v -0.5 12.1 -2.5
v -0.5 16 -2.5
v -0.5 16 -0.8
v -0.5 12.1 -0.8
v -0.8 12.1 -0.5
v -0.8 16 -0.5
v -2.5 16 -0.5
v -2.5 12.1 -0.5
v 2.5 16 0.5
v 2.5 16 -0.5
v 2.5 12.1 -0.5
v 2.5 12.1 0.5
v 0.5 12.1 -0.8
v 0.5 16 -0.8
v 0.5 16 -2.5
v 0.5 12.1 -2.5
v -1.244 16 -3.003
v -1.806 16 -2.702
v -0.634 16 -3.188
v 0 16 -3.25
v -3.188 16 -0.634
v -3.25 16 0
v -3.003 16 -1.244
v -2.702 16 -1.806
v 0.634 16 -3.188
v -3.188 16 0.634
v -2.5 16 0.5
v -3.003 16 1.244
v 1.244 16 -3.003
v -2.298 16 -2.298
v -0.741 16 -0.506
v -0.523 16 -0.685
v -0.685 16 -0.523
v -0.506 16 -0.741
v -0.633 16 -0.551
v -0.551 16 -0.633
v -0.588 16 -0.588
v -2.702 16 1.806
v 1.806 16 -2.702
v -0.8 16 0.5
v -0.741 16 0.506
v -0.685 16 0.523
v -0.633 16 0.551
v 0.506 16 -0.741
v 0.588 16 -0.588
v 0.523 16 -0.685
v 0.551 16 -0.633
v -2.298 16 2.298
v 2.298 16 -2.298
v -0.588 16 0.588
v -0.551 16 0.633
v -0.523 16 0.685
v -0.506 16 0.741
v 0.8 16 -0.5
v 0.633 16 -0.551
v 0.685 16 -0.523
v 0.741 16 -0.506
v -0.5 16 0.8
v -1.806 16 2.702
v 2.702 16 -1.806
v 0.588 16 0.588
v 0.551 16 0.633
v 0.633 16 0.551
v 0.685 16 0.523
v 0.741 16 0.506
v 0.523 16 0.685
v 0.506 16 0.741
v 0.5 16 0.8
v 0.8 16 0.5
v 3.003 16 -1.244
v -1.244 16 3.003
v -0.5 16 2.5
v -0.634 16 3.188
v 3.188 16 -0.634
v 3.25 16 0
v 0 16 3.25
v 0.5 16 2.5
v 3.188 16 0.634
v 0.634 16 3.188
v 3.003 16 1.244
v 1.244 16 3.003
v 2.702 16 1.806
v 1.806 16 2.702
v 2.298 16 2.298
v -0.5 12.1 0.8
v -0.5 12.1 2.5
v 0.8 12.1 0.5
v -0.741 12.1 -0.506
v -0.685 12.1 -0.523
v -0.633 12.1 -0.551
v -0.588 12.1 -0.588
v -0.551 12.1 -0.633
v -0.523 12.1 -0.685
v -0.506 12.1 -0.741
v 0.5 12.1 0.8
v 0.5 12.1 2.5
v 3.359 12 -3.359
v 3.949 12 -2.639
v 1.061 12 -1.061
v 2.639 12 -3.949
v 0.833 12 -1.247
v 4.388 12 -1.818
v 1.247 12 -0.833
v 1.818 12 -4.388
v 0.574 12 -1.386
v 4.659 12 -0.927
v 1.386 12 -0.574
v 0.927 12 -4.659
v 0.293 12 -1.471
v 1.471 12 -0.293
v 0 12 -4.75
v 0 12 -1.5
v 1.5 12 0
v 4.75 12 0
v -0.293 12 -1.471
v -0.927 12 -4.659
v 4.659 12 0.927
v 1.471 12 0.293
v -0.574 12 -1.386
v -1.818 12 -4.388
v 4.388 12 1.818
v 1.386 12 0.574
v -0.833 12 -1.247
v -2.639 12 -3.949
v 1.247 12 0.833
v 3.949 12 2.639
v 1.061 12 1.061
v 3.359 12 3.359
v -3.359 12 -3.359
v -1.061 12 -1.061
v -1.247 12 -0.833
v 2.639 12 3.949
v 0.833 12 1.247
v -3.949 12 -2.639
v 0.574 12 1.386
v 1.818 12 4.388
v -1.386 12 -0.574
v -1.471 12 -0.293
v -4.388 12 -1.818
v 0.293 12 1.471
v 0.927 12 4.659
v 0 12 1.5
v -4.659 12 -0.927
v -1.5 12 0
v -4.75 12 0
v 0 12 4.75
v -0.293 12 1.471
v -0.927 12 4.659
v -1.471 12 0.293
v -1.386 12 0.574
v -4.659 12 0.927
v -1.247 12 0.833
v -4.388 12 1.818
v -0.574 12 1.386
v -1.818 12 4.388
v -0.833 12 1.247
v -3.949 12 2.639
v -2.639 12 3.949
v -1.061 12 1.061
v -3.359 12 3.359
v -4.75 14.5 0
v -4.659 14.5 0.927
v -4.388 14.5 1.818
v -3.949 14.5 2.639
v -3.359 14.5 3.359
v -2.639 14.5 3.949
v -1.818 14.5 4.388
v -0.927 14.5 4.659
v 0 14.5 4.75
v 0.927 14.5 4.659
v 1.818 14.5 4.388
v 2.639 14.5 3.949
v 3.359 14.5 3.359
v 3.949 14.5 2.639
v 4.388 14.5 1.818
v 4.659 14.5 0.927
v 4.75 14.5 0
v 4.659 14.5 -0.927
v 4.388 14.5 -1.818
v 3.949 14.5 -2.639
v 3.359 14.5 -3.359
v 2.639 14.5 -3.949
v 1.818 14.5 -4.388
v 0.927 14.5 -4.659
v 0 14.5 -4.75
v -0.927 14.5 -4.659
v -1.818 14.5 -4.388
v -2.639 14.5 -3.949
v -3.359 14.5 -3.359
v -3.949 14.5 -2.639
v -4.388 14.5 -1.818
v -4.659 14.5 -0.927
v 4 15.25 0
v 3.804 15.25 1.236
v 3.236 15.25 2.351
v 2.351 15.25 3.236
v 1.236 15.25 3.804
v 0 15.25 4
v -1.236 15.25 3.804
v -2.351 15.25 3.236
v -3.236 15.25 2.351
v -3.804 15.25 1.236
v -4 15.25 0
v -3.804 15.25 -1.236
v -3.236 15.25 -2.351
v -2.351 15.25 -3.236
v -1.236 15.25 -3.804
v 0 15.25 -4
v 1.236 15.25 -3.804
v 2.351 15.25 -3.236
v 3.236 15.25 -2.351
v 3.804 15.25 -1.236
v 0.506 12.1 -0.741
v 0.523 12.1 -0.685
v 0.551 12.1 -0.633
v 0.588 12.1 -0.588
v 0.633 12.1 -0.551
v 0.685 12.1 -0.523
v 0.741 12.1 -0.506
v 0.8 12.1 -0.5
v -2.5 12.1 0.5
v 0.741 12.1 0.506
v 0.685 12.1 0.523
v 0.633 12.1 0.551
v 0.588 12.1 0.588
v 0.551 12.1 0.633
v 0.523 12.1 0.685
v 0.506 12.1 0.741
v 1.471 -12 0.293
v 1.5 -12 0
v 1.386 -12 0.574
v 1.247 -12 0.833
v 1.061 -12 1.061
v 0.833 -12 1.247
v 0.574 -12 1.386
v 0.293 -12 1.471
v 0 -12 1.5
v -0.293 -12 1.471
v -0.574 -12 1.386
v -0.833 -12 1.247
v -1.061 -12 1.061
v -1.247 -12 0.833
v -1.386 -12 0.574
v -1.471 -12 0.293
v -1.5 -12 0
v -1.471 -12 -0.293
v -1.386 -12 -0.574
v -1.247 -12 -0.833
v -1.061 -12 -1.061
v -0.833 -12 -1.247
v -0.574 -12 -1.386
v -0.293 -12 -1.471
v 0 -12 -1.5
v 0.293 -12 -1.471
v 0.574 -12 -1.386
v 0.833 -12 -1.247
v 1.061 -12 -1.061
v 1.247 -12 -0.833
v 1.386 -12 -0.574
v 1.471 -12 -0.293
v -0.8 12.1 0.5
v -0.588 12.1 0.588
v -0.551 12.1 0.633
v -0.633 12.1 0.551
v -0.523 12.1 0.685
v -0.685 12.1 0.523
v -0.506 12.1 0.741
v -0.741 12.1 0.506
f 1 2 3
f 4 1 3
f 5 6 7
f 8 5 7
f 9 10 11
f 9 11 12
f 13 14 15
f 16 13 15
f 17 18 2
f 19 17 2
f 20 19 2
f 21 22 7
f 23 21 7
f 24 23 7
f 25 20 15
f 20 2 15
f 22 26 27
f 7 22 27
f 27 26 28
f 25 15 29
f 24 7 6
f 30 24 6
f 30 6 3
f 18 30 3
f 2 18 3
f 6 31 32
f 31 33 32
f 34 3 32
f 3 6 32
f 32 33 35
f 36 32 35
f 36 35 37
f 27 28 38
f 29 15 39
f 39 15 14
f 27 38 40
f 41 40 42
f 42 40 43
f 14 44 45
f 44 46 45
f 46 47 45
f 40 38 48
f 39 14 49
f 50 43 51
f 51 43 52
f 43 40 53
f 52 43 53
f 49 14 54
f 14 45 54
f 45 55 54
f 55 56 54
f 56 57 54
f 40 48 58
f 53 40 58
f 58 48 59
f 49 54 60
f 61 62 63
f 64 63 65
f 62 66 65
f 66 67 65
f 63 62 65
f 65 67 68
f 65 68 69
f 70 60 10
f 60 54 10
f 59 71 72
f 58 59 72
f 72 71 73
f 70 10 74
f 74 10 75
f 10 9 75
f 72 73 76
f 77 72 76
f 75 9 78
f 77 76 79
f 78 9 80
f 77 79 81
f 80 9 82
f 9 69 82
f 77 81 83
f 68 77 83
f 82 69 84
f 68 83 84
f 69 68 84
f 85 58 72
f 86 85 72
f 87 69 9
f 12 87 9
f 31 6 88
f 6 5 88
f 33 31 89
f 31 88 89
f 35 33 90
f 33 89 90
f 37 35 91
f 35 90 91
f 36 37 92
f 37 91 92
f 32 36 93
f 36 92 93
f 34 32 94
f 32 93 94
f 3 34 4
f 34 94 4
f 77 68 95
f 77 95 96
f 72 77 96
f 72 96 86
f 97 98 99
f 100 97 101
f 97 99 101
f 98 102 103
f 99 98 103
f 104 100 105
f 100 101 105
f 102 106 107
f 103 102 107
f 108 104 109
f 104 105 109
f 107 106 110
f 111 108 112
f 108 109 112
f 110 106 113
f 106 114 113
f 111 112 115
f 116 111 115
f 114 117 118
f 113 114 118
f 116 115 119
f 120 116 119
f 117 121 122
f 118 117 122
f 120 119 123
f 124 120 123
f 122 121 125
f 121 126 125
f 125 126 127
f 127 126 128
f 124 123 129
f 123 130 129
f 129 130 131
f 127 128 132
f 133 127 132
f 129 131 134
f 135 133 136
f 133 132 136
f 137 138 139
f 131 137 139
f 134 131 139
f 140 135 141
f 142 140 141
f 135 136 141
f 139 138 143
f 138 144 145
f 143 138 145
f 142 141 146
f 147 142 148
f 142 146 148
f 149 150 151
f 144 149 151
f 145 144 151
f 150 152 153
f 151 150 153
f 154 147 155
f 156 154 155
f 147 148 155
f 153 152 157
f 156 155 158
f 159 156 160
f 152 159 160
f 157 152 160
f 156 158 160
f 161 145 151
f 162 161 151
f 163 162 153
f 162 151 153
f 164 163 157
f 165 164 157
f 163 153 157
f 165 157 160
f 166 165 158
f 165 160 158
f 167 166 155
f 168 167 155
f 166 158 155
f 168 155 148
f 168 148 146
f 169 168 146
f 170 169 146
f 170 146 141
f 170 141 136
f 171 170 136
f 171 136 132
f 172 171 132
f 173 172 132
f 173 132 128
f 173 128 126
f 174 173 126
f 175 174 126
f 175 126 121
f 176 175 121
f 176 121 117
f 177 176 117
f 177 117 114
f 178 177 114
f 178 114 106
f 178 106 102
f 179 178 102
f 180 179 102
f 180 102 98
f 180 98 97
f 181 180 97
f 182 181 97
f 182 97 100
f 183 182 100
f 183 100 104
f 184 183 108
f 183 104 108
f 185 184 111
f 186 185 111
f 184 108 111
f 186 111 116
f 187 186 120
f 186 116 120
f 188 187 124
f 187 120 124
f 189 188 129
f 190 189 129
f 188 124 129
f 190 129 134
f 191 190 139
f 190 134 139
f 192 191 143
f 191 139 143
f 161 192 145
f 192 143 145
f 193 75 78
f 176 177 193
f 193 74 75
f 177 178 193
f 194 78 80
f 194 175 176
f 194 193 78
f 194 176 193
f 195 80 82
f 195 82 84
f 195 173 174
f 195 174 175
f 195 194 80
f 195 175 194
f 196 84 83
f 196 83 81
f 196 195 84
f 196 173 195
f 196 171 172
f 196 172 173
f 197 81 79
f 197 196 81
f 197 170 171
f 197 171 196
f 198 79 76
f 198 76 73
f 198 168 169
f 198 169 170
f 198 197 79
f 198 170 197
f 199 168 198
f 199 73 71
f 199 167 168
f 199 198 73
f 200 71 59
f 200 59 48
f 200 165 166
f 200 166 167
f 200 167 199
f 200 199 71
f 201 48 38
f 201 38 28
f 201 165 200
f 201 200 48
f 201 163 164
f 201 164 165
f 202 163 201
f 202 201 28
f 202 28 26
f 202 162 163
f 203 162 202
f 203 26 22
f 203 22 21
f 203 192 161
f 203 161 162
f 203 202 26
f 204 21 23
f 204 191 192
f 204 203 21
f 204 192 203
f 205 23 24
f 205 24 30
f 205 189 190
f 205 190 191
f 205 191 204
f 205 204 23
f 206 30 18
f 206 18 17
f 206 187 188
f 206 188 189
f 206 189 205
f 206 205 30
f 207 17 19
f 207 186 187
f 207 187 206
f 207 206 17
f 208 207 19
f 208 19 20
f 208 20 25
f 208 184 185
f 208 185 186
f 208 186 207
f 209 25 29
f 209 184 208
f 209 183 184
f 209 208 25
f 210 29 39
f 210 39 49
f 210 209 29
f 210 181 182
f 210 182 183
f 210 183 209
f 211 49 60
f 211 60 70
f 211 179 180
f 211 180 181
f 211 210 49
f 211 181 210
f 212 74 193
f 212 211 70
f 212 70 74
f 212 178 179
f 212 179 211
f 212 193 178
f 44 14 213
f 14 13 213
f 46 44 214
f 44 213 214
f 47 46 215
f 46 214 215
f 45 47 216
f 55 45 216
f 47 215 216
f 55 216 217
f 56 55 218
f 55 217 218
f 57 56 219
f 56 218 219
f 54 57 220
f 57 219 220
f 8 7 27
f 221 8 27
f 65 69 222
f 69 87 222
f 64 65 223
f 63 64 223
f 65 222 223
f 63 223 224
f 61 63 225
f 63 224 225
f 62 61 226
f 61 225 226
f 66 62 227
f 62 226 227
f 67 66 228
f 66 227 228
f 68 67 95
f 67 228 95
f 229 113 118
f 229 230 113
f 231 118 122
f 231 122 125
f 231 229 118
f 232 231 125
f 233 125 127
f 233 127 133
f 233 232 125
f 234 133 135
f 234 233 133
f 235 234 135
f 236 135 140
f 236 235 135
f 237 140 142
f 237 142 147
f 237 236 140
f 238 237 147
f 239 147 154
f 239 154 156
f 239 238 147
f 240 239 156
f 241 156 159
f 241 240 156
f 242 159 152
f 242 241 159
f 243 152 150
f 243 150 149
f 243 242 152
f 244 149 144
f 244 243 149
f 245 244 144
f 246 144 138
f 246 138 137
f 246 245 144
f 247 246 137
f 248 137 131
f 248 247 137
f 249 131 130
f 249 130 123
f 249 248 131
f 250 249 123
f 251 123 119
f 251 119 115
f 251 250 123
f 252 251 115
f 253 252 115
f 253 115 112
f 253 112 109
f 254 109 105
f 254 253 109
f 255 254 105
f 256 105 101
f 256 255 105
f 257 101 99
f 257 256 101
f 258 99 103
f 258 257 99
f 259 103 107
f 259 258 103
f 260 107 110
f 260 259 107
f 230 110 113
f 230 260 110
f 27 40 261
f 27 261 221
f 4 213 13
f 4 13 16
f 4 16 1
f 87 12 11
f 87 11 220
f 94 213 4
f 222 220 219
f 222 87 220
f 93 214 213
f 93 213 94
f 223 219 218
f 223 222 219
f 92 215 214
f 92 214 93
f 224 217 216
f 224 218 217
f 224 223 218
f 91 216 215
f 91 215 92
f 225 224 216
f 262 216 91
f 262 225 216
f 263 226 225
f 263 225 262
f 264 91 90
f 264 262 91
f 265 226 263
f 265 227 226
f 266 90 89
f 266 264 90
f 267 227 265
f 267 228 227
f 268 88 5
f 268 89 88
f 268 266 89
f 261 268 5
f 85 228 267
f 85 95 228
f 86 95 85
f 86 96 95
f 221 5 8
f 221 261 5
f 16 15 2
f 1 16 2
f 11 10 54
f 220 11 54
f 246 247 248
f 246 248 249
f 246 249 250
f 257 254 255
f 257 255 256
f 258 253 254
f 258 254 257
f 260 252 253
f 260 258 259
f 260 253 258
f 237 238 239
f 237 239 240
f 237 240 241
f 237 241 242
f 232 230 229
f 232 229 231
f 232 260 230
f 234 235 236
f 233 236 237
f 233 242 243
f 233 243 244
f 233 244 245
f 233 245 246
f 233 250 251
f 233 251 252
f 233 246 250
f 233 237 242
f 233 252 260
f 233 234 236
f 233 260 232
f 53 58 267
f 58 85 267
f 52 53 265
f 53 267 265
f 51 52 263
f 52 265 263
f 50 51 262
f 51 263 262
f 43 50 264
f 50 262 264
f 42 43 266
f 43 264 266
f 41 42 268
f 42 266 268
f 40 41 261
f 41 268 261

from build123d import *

# Parameters (mm, degrees)
F0_R      = 1.5
F1_DEPTH  = 12
F2_R      = 4.75
F2_R_2    = 1.5
F3_DEPTH  = 2.5
F5_R      = 3.25
F3_FACE_R = 4.75
F7_W      = 1
F7_H      = 2
F7_H_2    = 1
F7_W_2    = 2
F8_DEPTH  = 3.9
F9_R      = 0.3


with BuildPart() as f1:
    # F0 (on Front) → F1 (new body, symmetric)
    with BuildSketch(Plane.XZ):
        Circle(F0_R)
    extrude(amount=F1_DEPTH, both=True)

    # F2 (on face) → F3 (join)
    with BuildSketch(Plane(origin=(0, 12, 0), x_dir=(-1, 0, 0), z_dir=(0, 1, 0))):
        Circle(F2_R)
        Circle(F2_R_2, mode=Mode.SUBTRACT)
        Circle(F2_R_2)
    extrude(amount=F3_DEPTH)

    # F5 (on offset) → F6 section 0
    with BuildSketch(Plane.XZ.offset(-16)):
        Circle(F5_R)
    # F3_face (on face) → F6 section 1
    with BuildSketch(Plane(origin=(0, 14.5, 0), x_dir=(-1, 0, 0), z_dir=(0, 1, 0))):
        Circle(F3_FACE_R)
    loft()

    # F7 (on face) → F8 (cut)
    with BuildSketch(Plane(origin=(0, 16, 0), x_dir=(-1, 0, 0), z_dir=(0, 1, 0))):
        with Locations((0, -1.5)):
            Rectangle(F7_W, F7_H)
        Rectangle(F7_W, F7_H_2)
        with Locations((-1.5, 0)):
            Rectangle(F7_W_2, F7_H_2)
        with Locations((0, 1.5)):
            Rectangle(F7_W, F7_H)
        with Locations((1.5, 0)):
            Rectangle(F7_W_2, F7_H_2)
    extrude(amount=-F8_DEPTH, mode=Mode.SUBTRACT)

    # F9
    f9_edges = [f1.edges().sort_by_distance(p)[0] for p in [
        (-0.5, 14.05, 0.5),
        (0.5, 14.05, 0.5),
        (0.5, 14.05, -0.5),
        (-0.5, 14.05, -0.5),
    ]]
    fillet(f9_edges, radius=F9_R)


solid = f1.part
